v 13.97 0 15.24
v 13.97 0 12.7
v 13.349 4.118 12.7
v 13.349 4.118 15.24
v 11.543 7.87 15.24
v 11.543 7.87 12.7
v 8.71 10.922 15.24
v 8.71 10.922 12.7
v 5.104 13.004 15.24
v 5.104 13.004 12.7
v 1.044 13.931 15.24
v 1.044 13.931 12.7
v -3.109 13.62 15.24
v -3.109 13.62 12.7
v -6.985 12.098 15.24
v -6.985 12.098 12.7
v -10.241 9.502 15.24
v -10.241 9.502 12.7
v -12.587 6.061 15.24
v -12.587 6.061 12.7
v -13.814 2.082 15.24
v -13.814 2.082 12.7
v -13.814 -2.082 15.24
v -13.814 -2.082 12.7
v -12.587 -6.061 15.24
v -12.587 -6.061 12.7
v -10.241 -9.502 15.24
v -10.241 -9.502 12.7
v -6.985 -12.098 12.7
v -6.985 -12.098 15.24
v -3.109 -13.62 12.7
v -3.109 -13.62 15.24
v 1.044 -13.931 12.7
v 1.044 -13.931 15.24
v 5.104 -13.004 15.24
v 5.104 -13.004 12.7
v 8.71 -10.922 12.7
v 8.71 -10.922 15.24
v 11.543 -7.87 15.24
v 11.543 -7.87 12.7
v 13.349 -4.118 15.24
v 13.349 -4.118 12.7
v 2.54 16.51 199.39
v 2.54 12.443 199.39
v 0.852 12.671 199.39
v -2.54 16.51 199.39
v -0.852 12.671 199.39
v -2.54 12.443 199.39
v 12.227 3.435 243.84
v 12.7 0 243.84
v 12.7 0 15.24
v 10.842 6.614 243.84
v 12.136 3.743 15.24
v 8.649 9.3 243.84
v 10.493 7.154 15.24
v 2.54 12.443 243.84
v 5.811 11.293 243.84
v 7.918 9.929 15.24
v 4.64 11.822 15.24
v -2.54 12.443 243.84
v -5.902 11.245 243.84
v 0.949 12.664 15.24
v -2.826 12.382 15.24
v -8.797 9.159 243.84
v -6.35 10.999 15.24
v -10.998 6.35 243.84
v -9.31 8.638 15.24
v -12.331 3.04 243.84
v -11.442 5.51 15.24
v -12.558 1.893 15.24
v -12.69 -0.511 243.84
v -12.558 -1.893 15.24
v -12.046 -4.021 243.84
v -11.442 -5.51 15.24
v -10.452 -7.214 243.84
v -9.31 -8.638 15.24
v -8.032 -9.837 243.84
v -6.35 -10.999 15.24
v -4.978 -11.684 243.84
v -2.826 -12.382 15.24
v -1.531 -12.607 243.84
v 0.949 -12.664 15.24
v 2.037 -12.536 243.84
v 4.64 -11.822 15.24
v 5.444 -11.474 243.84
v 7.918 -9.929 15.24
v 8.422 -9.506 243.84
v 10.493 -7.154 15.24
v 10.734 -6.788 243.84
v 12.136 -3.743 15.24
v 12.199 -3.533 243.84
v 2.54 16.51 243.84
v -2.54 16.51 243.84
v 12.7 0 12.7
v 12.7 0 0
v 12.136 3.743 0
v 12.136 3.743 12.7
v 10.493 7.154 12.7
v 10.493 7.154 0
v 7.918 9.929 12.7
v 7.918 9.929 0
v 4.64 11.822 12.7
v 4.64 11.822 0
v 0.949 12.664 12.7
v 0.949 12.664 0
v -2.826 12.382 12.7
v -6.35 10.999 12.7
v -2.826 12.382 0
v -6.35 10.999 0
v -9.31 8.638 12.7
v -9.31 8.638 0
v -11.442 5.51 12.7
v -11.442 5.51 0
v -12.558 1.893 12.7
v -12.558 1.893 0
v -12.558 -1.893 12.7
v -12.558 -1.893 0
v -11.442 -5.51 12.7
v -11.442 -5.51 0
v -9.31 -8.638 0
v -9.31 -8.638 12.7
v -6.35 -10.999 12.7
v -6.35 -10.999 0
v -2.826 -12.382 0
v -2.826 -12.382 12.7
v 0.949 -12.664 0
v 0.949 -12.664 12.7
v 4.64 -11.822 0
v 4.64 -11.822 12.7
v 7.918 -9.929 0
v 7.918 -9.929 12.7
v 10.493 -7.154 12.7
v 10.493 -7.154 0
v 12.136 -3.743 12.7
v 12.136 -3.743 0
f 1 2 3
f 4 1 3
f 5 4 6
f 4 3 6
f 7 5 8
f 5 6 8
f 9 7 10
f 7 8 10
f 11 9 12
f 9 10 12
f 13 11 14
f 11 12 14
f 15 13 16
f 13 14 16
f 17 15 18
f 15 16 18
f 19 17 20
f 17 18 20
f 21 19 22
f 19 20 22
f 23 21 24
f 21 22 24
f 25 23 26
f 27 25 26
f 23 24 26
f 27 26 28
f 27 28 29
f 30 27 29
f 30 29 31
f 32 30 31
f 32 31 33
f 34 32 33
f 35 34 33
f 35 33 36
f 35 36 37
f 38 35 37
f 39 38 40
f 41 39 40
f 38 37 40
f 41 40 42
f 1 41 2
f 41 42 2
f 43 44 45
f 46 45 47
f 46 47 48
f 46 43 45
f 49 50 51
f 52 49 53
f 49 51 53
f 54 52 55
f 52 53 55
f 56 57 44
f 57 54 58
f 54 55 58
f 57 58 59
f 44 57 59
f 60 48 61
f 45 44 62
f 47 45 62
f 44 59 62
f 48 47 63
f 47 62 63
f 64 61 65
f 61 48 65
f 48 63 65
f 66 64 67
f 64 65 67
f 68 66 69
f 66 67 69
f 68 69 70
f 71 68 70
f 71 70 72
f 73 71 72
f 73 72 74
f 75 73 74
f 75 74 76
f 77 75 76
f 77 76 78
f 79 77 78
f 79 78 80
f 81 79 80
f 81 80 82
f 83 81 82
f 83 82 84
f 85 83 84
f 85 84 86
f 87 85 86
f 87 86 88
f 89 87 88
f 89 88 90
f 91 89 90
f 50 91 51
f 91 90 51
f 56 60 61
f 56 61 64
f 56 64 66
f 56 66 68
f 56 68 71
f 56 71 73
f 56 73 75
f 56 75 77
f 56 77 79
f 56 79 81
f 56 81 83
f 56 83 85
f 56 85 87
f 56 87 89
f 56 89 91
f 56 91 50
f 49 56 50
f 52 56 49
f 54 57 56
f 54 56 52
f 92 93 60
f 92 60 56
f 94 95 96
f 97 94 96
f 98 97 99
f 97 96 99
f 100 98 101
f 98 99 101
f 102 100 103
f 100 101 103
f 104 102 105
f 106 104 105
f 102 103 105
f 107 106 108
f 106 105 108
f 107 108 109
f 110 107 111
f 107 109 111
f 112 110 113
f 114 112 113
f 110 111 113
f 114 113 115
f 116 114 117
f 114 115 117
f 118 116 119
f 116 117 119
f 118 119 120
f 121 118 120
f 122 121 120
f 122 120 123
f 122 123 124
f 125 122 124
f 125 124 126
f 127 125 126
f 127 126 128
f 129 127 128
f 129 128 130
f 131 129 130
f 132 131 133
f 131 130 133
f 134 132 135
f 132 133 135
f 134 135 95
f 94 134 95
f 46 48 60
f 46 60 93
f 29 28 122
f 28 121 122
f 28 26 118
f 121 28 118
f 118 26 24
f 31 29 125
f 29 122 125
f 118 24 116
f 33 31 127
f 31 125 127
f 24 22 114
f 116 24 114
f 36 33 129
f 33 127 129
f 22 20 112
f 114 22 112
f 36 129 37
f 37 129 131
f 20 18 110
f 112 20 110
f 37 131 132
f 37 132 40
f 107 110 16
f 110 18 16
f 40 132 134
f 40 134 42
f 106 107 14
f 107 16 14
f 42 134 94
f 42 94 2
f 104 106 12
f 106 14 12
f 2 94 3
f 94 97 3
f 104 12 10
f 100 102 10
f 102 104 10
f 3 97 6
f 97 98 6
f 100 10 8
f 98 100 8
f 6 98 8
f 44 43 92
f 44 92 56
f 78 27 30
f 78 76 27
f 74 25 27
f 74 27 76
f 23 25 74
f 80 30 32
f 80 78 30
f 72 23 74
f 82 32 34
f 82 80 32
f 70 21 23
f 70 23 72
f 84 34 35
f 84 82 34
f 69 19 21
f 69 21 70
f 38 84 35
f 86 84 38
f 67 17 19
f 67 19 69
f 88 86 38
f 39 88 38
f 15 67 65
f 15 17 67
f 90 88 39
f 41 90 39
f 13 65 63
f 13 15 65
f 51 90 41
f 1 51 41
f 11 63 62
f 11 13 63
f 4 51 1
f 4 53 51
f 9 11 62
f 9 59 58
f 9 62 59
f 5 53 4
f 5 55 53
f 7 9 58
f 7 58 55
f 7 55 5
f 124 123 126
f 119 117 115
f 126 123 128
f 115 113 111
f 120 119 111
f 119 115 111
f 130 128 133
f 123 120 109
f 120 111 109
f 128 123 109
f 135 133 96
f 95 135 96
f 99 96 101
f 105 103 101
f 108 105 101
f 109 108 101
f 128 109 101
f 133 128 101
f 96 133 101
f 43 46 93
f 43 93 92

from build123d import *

# Parameters (mm, degrees)
SKETCH1_R           = 12.7
BOSS_EXTRUDE1_DEPTH = 12.7
SKETCH2_R           = 13.97
BOSS_EXTRUDE2_DEPTH = 2.54
SKETCH3_R           = 12.7
BOSS_EXTRUDE3_DEPTH = 228.6
BOSS_EXTRUDE4_START = -44.45
BOSS_EXTRUDE4_DEPTH = 44.45


with BuildPart() as part:
    # Sketch1 → Boss-Extrude1 (new body)
    with BuildSketch(Plane.XY):
        Circle(SKETCH1_R)
    extrude(amount=BOSS_EXTRUDE1_DEPTH)

    # Sketch2 → Boss-Extrude2 (add)
    with BuildSketch(Plane.XY.offset(12.7)):
        Circle(SKETCH2_R)
    extrude(amount=BOSS_EXTRUDE2_DEPTH)

    # Sketch3 → Boss-Extrude3 (add)
    with BuildSketch(Plane.XY.offset(15.24)):
        Circle(SKETCH3_R)
    extrude(amount=BOSS_EXTRUDE3_DEPTH)

    # Sketch4 → Boss-Extrude4 (add)
    with BuildSketch(Plane.XY.offset(243.84).offset(BOSS_EXTRUDE4_START)):
        with BuildLine():
            Line((-2.54, 16.51), (2.54, 16.51))
            Line((2.54, 16.51), (2.54, 12.443407893))
            ThreePointArc((2.54, 12.443407893), (0, 12.7), (-2.54, 12.443407893))
            Line((-2.54, 12.443407893), (-2.54, 16.51))
        make_face()
    extrude(amount=BOSS_EXTRUDE4_DEPTH)


solid = part.part
